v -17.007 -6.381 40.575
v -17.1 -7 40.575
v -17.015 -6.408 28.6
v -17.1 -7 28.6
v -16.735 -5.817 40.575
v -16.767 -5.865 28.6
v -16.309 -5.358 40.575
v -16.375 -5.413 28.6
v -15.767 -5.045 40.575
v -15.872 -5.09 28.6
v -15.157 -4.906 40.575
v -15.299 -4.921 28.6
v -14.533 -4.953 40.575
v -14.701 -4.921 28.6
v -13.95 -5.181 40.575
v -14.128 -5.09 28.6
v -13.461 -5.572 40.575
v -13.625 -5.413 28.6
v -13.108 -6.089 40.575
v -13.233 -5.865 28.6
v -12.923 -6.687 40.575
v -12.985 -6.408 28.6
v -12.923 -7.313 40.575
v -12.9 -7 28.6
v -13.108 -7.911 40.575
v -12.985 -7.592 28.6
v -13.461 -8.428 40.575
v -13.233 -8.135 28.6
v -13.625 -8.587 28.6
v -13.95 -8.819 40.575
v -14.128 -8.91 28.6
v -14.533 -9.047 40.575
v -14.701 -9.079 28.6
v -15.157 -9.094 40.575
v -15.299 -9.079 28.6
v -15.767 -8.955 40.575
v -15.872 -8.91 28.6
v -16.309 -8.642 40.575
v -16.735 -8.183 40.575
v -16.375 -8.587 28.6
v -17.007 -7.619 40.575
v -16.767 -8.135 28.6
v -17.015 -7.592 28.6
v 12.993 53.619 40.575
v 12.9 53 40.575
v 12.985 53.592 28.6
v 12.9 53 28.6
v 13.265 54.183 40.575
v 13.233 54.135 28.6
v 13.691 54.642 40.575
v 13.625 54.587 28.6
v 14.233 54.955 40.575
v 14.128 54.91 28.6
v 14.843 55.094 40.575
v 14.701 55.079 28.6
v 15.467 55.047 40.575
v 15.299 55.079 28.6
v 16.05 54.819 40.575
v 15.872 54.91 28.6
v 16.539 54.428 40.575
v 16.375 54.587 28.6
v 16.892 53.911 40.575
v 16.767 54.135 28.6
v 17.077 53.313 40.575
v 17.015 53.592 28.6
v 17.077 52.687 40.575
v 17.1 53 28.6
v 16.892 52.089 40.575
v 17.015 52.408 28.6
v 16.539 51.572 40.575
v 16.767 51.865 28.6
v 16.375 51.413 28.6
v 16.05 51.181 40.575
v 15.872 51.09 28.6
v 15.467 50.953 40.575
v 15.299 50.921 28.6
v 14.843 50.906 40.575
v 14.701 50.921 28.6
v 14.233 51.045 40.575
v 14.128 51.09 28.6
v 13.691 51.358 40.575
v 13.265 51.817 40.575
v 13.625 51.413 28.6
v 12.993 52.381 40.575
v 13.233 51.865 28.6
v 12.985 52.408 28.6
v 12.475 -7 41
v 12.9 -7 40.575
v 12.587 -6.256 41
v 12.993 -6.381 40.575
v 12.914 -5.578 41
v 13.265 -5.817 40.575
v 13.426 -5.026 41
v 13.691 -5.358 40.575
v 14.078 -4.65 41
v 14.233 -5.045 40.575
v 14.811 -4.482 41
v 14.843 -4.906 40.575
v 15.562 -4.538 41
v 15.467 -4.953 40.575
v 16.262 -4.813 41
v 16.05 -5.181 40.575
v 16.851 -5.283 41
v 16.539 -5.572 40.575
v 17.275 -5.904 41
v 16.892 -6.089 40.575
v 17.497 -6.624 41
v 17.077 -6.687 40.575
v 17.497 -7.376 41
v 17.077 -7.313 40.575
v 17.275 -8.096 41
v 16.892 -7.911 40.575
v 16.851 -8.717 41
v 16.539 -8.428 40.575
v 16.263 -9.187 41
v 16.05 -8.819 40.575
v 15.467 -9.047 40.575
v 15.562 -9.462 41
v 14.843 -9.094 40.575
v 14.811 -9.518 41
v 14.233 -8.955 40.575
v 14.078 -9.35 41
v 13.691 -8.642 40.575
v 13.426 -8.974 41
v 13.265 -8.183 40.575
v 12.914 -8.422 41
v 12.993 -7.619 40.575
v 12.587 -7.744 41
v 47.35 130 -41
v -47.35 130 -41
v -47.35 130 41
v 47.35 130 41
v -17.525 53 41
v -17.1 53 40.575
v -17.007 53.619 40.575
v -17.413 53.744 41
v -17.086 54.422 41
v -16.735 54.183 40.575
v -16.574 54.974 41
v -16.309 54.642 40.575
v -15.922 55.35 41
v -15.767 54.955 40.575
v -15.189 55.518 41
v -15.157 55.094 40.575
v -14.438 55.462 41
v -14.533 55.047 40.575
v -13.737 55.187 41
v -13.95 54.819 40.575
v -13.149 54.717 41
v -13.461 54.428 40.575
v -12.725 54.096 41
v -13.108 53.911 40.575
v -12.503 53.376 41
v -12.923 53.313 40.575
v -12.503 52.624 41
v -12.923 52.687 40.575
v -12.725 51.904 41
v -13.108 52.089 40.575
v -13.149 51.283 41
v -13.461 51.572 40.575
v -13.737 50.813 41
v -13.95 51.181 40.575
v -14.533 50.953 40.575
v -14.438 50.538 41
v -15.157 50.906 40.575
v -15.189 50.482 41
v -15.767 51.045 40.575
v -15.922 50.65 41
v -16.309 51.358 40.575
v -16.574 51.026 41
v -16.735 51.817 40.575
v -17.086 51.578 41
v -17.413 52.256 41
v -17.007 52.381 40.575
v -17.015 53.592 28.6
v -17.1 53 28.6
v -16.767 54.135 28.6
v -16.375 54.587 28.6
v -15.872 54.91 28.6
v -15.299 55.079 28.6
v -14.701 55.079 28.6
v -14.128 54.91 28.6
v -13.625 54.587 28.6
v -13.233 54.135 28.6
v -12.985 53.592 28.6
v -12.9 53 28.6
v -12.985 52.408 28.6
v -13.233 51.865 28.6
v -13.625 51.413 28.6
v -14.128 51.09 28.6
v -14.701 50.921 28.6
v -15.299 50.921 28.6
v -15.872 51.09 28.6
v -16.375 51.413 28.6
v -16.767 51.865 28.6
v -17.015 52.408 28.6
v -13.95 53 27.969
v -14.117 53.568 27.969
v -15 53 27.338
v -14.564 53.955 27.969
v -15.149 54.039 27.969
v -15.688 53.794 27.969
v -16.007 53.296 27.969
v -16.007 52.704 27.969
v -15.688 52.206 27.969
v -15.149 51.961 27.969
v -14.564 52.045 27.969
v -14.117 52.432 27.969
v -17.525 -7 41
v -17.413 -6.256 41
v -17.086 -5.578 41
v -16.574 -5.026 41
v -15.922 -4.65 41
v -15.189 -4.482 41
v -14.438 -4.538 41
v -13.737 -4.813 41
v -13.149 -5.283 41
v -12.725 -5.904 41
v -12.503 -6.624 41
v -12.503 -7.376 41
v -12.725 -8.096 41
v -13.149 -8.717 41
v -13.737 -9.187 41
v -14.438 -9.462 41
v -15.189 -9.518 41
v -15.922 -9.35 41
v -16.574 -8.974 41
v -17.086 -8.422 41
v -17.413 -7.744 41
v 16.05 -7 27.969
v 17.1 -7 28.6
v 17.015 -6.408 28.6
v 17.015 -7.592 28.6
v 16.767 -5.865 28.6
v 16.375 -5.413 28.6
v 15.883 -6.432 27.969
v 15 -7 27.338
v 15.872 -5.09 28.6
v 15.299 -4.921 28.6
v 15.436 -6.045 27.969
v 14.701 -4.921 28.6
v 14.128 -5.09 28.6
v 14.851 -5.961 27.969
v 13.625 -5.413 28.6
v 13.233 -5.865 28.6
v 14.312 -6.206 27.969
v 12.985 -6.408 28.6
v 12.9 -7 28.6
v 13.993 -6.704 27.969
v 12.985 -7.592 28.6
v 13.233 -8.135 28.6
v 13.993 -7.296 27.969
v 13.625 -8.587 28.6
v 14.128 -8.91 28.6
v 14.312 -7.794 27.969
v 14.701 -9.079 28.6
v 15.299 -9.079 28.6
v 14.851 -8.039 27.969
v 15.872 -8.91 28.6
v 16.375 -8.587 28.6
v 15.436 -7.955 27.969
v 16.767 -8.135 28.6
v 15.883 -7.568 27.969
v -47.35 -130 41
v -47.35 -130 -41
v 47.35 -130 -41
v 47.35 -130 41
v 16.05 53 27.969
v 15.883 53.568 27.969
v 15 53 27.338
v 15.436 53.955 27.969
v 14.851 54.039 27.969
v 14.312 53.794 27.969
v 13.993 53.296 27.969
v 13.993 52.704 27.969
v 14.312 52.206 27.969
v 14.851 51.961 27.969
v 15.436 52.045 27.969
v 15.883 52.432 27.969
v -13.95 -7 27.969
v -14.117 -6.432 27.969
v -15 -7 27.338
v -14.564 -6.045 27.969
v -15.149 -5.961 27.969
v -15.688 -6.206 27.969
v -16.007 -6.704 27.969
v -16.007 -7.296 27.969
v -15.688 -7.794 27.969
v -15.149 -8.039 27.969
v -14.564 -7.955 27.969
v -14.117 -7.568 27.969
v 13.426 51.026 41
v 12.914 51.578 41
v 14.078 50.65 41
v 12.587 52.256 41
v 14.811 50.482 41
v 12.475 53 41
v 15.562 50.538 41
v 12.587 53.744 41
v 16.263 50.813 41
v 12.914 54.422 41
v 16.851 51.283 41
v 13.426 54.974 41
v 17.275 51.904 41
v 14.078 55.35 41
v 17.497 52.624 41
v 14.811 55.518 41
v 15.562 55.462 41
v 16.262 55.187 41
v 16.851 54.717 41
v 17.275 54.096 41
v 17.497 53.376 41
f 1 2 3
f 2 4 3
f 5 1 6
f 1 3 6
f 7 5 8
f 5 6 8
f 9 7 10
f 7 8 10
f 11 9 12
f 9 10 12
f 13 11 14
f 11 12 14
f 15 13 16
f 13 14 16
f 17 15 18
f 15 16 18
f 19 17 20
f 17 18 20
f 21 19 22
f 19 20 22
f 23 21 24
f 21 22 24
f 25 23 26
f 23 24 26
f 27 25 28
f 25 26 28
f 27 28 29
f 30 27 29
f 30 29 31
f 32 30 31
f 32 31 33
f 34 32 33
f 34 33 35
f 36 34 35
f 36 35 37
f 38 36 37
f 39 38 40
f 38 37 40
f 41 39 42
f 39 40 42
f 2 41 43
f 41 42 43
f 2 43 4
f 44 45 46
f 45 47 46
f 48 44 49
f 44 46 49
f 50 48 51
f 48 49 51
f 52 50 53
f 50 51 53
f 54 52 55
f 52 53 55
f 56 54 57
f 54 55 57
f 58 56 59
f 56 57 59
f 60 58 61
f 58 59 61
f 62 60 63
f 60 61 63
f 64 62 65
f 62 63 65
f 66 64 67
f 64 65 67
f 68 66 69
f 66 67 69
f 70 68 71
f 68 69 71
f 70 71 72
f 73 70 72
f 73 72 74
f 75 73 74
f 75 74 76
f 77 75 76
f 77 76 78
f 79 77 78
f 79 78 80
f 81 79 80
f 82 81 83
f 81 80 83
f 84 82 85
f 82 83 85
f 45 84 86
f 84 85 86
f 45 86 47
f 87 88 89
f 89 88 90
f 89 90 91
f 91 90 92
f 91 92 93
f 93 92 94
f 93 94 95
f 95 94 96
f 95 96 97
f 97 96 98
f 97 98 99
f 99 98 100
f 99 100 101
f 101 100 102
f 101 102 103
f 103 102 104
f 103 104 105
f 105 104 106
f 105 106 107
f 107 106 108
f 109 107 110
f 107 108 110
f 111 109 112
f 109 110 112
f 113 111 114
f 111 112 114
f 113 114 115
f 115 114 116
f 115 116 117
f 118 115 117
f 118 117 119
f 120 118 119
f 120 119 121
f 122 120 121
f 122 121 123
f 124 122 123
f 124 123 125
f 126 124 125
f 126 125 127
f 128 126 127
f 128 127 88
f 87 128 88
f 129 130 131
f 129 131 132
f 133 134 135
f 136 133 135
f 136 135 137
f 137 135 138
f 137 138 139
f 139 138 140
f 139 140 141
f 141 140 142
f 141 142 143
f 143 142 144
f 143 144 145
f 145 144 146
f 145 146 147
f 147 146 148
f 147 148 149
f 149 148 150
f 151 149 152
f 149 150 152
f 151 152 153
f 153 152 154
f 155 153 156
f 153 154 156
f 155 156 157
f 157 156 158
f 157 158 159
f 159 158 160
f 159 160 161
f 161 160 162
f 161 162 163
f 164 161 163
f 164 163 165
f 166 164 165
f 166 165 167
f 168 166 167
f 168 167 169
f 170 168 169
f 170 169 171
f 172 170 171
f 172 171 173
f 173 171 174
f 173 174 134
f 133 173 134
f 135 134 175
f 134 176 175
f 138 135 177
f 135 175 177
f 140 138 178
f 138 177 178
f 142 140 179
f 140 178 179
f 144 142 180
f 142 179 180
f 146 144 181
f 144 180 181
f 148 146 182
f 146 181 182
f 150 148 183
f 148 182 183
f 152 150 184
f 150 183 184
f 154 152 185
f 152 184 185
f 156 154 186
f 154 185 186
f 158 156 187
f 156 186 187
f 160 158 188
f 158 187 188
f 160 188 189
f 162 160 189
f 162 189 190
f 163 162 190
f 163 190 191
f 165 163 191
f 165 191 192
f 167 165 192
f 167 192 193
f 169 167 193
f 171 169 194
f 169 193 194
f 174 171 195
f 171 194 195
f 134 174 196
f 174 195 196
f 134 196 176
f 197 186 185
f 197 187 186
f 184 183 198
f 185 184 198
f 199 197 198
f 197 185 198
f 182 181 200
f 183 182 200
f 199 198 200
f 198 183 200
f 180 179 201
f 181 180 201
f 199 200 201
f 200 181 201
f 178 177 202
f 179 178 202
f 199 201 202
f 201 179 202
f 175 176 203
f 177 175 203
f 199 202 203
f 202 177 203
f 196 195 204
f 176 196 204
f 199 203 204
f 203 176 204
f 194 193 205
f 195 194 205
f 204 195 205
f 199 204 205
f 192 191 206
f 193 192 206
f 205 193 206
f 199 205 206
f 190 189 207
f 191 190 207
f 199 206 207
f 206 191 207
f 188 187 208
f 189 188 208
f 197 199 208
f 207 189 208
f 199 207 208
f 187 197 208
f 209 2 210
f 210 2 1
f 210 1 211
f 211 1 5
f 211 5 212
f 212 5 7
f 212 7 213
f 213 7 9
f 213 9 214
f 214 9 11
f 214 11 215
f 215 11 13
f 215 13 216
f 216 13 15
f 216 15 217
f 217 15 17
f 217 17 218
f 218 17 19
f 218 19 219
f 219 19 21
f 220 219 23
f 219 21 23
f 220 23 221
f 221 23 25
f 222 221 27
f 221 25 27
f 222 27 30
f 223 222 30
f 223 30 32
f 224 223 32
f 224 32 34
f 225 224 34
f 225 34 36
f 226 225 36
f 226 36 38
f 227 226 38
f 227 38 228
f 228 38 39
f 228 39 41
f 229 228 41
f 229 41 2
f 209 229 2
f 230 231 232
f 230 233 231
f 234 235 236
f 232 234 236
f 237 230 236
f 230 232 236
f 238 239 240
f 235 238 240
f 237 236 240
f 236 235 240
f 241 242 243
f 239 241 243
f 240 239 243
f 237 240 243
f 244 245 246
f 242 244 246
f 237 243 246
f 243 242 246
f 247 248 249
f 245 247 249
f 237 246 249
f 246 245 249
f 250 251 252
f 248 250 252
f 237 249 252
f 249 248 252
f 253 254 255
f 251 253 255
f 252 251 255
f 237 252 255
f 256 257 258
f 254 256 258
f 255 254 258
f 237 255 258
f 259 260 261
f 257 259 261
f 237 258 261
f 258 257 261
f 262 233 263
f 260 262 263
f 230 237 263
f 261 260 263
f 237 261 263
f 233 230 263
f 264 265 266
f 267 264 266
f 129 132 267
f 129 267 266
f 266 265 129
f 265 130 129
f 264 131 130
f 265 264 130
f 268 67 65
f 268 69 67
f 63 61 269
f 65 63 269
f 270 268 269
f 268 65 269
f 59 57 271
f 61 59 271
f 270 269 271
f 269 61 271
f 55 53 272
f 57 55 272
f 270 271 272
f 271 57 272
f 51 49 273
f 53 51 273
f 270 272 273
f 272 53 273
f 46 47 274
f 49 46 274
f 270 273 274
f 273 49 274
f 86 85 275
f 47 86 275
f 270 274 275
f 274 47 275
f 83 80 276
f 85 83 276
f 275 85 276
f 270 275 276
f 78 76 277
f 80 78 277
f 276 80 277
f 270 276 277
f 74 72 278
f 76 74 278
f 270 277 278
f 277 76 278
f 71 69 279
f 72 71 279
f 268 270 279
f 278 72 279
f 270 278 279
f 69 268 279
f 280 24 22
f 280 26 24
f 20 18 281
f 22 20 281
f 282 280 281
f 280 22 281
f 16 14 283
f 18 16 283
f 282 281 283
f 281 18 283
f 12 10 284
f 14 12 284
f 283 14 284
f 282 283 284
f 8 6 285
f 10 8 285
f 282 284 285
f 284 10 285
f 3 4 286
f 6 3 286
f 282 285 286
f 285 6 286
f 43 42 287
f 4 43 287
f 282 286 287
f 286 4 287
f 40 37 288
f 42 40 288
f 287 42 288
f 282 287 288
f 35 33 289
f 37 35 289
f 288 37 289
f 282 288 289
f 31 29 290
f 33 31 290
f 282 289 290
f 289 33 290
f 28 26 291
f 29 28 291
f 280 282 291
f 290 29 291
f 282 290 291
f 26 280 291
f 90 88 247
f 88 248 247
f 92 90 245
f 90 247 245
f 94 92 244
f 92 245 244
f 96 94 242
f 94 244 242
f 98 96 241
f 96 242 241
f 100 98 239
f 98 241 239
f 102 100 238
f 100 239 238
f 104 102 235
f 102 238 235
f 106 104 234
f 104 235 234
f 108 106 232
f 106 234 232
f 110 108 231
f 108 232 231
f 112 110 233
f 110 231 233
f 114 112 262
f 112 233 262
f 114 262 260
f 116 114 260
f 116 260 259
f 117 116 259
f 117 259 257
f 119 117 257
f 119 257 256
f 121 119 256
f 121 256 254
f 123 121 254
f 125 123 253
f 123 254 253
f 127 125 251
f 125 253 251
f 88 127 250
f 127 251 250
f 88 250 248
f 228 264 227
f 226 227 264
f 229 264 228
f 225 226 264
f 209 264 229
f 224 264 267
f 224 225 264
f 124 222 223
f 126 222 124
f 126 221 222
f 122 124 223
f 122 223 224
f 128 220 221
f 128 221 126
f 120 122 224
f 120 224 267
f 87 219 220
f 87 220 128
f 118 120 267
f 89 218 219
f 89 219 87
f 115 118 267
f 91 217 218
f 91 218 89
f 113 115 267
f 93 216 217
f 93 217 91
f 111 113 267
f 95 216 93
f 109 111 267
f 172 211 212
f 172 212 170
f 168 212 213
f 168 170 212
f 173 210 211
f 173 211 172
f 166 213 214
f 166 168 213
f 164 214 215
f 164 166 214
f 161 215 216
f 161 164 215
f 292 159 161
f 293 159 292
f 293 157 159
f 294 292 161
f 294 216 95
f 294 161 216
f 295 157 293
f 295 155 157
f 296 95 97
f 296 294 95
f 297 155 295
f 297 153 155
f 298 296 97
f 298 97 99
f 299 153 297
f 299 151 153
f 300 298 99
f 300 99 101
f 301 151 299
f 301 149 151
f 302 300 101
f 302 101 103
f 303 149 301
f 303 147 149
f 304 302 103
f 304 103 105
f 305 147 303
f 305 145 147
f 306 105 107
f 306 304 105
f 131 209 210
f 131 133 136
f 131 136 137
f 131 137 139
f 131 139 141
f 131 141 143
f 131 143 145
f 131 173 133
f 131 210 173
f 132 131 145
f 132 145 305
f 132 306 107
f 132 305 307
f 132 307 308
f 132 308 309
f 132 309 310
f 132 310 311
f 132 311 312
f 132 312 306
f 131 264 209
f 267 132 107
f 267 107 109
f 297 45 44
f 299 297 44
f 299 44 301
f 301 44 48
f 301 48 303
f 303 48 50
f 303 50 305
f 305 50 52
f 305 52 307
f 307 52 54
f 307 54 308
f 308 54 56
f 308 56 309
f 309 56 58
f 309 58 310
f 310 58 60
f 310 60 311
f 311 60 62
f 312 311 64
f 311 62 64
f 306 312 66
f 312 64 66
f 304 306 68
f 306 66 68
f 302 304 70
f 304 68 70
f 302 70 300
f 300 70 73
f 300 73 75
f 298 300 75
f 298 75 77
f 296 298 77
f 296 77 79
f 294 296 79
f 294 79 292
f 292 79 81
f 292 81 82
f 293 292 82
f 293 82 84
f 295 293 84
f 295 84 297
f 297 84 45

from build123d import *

# Parameters (mm, degrees)
SKETCH1_W                       = 94.7
SKETCH1_H                       = 82
BOSS_EXTRUDE1_DEPTH             = 130
M5X0_8_TAPPED_HOLE1_D           = 4.2
M5X0_8_TAPPED_HOLE1_DEPTH       = 12.4
M5X0_8_TAPPED_HOLE1_CSINK_D     = 5.05
M5X0_8_TAPPED_HOLE1_CSINK_ANGLE = 90
M5X0_8_TAPPED_HOLE1_TIP         = 1.2618073


with BuildPart() as part:
    # Sketch1 → Boss-Extrude1 (new, symmetric)
    with BuildSketch(Plane(origin=(0, 0, 0), x_dir=(1, 0, 0), z_dir=(0, 1, 0))):
        Rectangle(SKETCH1_W, SKETCH1_H)
    extrude(amount=BOSS_EXTRUDE1_DEPTH, both=True)

    # M5x0.8 Tapped Hole1
    with Locations(Plane.XY.offset(41)):
        with Locations((15, 53), (-15, 53), (-15, -7), (15, -7)):
            CounterSinkHole(M5X0_8_TAPPED_HOLE1_D / 2, M5X0_8_TAPPED_HOLE1_CSINK_D / 2, depth=M5X0_8_TAPPED_HOLE1_DEPTH, counter_sink_angle=M5X0_8_TAPPED_HOLE1_CSINK_ANGLE)
            with Locations((0, 0, -(M5X0_8_TAPPED_HOLE1_DEPTH + M5X0_8_TAPPED_HOLE1_TIP / 2))):  # 118° drill point
                Cone(0, M5X0_8_TAPPED_HOLE1_D / 2, M5X0_8_TAPPED_HOLE1_TIP, mode=Mode.SUBTRACT)


solid = part.part
